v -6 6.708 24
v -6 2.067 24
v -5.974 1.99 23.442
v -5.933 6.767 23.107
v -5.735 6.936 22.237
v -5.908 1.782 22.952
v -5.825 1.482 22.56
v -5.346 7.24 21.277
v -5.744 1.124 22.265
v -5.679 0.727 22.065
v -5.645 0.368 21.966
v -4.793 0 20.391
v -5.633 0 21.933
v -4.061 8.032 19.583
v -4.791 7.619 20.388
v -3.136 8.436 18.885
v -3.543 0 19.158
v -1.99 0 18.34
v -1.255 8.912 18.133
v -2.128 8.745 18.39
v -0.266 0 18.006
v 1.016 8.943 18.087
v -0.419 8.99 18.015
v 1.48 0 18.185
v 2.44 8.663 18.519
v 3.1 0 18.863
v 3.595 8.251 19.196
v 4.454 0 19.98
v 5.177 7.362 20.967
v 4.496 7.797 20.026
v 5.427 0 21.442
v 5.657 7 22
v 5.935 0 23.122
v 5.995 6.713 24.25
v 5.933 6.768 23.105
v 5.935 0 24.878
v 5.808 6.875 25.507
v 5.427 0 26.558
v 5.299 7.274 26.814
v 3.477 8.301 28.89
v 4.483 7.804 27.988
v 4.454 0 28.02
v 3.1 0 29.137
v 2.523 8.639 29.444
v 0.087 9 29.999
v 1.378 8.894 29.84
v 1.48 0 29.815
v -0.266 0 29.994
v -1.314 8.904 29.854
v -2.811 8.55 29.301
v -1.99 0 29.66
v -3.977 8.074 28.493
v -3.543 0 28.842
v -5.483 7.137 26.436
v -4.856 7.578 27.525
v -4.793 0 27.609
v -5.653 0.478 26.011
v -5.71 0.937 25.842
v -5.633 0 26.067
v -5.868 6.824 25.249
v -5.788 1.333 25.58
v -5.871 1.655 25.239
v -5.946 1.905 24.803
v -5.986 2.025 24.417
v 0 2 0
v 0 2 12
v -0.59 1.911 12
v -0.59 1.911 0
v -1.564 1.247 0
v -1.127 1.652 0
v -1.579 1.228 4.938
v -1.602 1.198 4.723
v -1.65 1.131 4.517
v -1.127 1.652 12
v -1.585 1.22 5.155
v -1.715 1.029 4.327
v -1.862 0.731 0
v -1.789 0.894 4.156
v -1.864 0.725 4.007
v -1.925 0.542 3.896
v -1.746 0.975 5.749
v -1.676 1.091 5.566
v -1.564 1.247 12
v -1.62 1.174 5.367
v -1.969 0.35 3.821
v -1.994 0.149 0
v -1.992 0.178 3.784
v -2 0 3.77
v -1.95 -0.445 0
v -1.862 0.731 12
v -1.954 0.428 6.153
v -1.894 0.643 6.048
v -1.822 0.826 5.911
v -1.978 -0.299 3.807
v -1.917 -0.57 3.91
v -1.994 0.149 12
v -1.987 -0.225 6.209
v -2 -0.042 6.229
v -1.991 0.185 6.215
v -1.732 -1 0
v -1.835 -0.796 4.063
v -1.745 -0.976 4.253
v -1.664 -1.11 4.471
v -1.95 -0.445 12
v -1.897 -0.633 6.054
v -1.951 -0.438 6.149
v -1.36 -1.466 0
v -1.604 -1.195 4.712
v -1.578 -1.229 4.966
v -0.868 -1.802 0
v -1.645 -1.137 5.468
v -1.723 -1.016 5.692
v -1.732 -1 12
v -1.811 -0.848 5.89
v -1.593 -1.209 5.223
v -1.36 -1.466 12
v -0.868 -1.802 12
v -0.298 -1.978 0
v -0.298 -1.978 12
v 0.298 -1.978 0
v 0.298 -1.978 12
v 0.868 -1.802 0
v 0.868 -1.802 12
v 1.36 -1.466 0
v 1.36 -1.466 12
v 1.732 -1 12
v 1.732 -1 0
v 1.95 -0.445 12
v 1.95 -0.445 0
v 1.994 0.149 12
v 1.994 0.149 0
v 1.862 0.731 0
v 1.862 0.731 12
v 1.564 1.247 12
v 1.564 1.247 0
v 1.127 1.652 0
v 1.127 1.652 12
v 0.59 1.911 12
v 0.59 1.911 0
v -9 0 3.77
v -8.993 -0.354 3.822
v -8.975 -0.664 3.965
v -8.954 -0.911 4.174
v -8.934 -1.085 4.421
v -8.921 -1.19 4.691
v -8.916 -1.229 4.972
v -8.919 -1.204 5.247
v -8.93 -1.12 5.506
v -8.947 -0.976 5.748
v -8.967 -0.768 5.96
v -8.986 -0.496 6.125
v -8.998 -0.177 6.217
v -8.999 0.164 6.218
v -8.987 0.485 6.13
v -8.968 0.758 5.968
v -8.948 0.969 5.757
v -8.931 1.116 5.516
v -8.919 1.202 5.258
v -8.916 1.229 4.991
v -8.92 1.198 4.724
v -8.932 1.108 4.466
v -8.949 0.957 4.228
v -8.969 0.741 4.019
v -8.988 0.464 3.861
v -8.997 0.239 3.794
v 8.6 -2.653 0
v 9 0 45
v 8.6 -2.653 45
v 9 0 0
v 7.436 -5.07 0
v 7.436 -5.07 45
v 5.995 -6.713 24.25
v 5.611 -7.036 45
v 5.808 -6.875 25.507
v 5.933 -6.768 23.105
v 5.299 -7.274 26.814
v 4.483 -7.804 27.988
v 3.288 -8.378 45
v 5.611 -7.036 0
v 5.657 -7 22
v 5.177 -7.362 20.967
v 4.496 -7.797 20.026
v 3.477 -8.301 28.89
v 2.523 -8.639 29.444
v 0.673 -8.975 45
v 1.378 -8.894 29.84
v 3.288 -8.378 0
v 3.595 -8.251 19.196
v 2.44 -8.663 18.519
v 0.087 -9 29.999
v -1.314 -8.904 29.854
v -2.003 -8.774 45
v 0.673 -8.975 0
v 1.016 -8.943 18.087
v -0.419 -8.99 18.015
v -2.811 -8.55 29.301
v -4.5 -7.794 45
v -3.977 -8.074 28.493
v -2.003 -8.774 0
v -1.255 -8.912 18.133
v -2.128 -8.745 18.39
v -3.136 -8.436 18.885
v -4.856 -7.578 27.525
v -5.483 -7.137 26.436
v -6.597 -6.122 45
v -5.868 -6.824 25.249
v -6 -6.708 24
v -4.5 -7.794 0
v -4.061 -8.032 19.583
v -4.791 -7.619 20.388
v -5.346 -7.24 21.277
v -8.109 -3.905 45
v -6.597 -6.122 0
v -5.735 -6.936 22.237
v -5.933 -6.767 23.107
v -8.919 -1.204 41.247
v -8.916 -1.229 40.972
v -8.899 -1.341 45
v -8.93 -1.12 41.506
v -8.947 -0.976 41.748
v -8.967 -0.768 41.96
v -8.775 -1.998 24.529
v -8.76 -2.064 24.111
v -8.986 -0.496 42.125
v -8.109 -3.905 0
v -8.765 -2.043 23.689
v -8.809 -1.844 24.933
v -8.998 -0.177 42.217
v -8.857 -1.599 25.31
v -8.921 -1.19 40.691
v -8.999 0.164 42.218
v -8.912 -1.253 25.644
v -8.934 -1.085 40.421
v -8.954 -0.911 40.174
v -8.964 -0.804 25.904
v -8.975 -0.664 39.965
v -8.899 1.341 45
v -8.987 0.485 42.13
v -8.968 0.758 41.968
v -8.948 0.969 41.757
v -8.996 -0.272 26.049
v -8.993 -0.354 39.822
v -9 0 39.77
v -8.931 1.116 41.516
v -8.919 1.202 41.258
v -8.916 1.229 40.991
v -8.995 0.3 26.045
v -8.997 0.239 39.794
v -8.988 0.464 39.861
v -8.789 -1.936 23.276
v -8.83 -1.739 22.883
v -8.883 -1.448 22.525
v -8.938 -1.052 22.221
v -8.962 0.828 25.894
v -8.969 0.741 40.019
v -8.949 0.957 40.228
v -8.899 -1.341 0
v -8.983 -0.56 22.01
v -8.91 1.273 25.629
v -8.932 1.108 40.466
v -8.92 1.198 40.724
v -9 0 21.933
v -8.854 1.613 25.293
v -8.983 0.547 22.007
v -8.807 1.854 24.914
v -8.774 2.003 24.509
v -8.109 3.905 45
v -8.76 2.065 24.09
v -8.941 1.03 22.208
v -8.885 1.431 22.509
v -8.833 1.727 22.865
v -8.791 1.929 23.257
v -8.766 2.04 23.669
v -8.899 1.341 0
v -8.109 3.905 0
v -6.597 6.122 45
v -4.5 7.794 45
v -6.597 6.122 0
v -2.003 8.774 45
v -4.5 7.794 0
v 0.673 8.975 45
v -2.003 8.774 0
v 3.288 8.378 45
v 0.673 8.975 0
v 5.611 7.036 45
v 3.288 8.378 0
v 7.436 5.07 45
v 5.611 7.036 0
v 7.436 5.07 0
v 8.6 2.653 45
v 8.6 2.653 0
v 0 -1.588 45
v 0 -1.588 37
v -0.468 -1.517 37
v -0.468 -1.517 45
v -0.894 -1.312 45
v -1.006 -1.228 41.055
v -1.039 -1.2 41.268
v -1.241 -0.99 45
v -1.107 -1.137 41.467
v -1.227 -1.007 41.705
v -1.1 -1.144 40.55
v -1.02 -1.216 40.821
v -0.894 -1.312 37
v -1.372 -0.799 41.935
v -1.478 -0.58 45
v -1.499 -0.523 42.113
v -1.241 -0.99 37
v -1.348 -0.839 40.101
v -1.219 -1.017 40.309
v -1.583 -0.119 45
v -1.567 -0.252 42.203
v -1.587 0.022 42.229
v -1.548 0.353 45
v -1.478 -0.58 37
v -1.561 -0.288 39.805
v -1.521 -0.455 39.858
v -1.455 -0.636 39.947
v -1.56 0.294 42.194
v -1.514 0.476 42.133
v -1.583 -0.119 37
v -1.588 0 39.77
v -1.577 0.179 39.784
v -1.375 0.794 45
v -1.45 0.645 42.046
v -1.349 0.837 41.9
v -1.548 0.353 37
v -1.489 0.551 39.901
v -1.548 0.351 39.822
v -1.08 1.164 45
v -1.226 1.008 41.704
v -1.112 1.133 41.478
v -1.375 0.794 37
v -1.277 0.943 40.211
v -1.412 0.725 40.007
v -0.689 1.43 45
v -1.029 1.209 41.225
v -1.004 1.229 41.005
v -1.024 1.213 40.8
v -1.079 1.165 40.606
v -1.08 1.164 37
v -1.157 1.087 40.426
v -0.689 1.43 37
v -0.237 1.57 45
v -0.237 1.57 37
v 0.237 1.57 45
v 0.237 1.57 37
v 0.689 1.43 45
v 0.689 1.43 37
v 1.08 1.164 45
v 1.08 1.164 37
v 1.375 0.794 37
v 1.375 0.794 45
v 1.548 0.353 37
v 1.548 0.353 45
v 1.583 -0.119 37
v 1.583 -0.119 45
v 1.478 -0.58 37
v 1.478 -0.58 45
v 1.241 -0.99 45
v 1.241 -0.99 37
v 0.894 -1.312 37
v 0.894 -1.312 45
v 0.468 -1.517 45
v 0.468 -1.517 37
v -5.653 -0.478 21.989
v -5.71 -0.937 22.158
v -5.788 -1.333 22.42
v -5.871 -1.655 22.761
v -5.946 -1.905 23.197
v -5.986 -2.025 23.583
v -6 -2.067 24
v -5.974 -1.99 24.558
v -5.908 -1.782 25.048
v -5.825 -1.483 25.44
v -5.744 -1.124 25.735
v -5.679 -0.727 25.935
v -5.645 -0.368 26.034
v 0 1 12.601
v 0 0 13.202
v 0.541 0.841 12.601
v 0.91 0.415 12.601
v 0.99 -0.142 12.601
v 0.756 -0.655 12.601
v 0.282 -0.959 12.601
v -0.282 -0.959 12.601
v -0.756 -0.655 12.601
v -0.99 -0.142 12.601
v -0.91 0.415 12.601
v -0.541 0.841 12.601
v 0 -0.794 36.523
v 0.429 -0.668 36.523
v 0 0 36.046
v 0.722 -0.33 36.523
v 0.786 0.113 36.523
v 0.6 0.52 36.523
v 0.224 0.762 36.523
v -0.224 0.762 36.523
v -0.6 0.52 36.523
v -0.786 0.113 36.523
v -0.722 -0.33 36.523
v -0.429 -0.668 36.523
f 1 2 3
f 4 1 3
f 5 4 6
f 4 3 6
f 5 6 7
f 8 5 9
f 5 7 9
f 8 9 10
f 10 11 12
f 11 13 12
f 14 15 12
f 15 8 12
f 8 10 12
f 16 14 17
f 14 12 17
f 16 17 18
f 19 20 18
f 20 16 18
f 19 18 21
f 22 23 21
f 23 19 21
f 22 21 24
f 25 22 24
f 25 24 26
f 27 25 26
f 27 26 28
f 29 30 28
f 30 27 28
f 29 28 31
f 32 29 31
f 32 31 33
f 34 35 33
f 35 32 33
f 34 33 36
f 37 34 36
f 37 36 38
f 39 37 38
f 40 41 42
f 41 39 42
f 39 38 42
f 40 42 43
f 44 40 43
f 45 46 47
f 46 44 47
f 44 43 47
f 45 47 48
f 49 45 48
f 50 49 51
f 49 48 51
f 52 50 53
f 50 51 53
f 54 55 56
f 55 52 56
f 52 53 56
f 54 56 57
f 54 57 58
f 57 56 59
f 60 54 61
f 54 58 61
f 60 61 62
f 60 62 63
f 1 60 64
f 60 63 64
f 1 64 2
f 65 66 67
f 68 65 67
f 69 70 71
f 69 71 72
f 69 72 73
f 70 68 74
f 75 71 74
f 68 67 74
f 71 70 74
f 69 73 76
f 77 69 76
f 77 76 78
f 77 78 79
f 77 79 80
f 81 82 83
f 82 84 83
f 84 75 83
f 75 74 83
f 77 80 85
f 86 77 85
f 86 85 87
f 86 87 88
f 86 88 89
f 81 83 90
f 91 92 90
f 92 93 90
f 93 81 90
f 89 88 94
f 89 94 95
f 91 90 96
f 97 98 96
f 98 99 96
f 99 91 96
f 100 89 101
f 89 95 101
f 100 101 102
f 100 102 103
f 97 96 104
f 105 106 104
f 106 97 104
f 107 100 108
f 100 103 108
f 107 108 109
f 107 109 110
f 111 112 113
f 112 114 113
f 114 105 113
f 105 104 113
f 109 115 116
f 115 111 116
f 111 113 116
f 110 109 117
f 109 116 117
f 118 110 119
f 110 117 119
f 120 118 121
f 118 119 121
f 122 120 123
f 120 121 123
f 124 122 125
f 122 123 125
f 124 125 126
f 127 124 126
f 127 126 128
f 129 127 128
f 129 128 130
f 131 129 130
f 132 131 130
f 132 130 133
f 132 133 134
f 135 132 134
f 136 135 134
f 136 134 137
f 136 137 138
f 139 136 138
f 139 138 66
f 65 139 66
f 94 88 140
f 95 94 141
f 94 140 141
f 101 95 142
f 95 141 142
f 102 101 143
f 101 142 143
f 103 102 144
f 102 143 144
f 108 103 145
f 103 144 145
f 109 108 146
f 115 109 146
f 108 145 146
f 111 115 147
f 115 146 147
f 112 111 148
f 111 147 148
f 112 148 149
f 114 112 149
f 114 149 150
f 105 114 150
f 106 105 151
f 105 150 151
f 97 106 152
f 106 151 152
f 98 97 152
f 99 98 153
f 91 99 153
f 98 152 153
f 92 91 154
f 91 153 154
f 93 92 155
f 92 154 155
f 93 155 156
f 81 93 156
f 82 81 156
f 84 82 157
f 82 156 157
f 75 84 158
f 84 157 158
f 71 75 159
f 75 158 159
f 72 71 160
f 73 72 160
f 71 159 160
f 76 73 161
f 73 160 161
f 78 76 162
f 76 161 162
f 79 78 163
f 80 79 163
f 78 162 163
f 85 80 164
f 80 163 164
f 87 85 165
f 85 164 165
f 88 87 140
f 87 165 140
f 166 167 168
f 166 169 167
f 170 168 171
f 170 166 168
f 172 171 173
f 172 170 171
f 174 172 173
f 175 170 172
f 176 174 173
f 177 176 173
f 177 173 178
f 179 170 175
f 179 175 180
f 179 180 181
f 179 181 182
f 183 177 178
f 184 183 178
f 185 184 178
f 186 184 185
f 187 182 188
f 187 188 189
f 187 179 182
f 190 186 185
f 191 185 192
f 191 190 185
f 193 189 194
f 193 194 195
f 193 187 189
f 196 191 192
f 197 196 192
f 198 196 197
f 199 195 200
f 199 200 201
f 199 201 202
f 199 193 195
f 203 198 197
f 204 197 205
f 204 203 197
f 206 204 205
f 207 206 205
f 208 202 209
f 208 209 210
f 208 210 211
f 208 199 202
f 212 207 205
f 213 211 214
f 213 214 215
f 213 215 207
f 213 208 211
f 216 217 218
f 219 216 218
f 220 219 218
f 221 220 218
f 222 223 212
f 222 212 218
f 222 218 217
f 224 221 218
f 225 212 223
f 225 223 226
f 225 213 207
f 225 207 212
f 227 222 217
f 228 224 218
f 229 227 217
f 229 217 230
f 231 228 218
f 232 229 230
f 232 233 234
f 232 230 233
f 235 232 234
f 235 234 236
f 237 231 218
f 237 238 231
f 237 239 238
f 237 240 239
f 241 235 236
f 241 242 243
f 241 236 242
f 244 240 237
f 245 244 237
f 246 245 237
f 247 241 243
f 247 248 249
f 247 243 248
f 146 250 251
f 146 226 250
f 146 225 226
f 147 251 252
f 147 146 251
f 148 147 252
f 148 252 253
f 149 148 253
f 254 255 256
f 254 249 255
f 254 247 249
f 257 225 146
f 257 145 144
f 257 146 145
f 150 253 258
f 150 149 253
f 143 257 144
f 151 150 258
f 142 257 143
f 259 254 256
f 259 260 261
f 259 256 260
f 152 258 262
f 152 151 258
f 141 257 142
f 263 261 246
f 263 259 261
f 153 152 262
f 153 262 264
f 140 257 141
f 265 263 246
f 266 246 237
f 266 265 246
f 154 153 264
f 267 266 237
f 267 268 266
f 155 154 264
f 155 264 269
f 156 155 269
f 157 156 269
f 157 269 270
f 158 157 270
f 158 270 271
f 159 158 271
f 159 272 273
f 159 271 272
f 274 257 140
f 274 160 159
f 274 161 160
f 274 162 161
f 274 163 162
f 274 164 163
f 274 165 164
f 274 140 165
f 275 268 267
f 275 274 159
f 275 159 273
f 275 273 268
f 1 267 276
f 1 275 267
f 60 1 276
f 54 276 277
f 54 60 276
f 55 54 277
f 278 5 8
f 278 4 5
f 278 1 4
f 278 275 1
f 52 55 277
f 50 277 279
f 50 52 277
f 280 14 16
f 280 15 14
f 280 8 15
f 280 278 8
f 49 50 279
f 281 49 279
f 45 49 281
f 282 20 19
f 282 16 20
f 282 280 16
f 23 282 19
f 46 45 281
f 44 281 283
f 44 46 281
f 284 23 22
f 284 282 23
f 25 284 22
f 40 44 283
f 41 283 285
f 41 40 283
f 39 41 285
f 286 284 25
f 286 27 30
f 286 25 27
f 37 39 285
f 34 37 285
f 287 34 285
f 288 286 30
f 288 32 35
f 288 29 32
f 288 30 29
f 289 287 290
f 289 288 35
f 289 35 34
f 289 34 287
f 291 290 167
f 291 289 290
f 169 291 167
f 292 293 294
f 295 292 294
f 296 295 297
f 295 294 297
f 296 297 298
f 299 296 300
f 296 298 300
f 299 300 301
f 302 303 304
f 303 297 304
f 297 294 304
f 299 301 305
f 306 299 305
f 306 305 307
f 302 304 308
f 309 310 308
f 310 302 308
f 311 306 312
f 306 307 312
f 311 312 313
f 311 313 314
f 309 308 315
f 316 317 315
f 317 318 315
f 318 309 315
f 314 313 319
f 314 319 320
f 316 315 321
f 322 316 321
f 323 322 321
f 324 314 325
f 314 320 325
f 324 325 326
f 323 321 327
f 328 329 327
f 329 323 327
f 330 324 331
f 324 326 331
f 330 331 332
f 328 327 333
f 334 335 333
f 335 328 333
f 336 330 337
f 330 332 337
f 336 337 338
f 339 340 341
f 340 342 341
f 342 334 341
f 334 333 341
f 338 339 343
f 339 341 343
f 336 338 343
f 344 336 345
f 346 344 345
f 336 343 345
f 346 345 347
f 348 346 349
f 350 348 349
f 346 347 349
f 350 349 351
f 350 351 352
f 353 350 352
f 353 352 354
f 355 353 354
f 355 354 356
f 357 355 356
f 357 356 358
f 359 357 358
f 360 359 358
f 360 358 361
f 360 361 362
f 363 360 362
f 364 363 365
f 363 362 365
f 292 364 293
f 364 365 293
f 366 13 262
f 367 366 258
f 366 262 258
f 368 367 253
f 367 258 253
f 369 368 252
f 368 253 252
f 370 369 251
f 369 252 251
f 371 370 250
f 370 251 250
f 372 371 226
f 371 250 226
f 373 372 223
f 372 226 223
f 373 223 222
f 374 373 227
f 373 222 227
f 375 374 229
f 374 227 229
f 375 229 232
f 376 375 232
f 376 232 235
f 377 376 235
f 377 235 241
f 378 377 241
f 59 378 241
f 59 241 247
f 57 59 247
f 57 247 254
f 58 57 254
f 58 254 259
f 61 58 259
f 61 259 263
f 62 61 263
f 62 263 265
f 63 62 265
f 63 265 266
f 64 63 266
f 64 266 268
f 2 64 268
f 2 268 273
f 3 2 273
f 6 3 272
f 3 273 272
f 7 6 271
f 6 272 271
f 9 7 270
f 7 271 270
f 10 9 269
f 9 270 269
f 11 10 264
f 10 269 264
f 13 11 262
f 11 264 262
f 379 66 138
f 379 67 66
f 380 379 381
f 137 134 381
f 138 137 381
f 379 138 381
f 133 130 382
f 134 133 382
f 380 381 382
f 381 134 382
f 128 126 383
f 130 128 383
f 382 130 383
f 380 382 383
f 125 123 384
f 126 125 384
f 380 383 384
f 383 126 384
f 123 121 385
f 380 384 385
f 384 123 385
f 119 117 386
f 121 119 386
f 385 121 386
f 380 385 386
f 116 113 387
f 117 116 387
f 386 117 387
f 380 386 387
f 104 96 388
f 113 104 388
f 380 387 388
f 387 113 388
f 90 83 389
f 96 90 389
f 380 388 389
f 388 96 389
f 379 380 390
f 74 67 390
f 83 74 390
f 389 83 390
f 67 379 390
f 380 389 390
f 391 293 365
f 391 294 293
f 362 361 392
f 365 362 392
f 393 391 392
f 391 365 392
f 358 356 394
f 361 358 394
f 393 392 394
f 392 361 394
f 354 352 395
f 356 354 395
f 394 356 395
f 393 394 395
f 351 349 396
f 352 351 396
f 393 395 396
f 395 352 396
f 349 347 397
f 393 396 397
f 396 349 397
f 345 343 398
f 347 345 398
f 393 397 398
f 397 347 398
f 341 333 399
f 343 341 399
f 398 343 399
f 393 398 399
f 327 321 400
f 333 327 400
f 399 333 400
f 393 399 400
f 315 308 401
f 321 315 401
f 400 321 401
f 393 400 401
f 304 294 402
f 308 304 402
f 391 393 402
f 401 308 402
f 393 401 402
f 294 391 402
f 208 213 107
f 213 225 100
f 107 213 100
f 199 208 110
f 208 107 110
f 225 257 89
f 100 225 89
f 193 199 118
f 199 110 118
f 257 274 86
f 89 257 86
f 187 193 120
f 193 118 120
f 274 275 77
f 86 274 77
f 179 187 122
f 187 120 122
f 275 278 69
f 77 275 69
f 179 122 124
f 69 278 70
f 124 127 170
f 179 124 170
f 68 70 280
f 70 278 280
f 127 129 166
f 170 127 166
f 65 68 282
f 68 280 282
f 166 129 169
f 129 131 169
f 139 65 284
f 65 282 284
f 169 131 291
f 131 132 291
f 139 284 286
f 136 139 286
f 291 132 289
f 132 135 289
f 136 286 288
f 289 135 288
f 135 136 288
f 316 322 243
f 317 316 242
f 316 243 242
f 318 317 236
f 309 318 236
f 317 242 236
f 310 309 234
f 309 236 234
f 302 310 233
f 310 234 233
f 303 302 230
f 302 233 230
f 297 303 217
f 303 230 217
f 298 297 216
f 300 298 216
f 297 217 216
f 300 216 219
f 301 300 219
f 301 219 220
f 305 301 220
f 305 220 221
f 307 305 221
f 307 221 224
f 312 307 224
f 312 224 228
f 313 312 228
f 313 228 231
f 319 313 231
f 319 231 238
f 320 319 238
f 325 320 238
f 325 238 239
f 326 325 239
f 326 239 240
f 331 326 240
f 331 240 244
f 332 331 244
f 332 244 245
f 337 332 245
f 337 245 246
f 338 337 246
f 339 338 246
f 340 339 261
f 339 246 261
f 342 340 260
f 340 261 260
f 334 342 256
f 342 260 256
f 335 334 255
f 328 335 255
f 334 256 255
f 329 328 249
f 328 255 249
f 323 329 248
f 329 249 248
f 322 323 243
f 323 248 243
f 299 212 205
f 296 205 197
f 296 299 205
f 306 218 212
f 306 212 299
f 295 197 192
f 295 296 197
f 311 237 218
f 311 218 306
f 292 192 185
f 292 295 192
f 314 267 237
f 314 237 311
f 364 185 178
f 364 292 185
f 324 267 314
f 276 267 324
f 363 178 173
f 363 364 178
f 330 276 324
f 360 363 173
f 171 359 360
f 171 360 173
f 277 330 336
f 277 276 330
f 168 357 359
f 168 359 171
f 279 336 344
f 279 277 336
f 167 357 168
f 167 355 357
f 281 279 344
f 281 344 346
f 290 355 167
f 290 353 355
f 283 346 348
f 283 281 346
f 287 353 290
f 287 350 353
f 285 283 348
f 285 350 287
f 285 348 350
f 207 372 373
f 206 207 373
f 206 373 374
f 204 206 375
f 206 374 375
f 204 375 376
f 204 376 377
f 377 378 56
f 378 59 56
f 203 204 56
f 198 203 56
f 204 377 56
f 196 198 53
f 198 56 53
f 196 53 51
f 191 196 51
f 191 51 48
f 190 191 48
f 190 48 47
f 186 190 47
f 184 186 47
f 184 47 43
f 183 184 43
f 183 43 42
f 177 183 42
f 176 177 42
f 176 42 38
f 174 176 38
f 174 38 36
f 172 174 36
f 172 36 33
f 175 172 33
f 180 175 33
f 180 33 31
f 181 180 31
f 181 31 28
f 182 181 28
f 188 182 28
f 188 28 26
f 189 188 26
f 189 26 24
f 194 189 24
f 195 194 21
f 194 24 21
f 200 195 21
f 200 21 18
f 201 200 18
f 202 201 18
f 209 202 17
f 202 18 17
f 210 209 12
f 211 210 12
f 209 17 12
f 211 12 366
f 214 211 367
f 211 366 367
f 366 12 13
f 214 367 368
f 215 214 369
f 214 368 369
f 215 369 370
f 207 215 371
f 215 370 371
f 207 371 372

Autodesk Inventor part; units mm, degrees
ref_plane "YZ Plane" through (0, 0, 0) normal (1, 0, 0) x (0, 1, 0)
ref_plane "XZ Plane" through (0, 0, 0) normal (0, 1, 0) x (-1, 0, 0)
ref_plane "XY Plane" through (0, 0, 0) normal (0, 0, 1) x (1, 0, 0)
sketch "Sketch1" plane through (0, 0, 0) normal (0, 0, 1) x (1, 0, 0)
  circle A0 centre (0, 0) radius 9
  dimension "d0" = 18
extrude "Extrusion1" add sketch "Sketch1" along normal blind 45
sketch "Sketch2" plane through (0, 0, 45) normal (0, 0, 1) x (1, 0, 0)
  point P0 (0, 0)
  point P1 (0, 0)
hole "Hole1" at (0, 0, 45) direction (0, 0, -1) diameter 3.175 depth 8 tip angle 118
sketch "Sketch3" plane through (0, 0, 0) normal (0, 0, -1) x (-1, 0, 0)
  point P0 (0, 0)
  point P1 (0, 0)
hole "Hole2" at (0, 0, 0) direction (0, 0, 1) diameter 4 depth 12 tip angle 118
sketch "Sketch4" plane through (0, 0, 0) normal (0, 1, 0) x (-1, 0, 0)
  circle A0 centre (0, 24) radius 6
  line L0 (9, 45) -> (-9, 45) projected
  point P0 (0, 0)
  dimension "d17" = 21
  dimension "d18" = 12
extrude "Extrusion2" cut sketch "Sketch4" along normal through all both and the other way through all
sketch "Sketch5" plane through (0, 0, 0) normal (1, 0, 0) x (0, 1, 0)
  line L0 (9, 45) -> (-9, 45) projected
  line L1 (-9, 0) -> (9, 0) projected
  point P0 (0, 0)
  point P1 (0, 41)
  point P2 (0, 5)
  dimension "d21" = 4
  dimension "d22" = 5
hole "Hole3" at (0, 0, 41) at (0, 0, 5) direction (-1, 0, 0) diameter 2.459 end through all thread size "M3x0.5" class "6H" standard "ANSI Metric M Profile"
sketch "Sketch6" plane through (0, 0, 0) normal (1, 0, 0) x (0, 1, 0)
  line L0 (-9, 0) -> (9, 0) projected
  point P0 (0, 0)
  point P1 (0, 24)
  dimension "d30" = 24
hole "Hole4" at (0, 0, 24) direction (-1, 0, 0) diameter 4.134 end through all thread size "M5x0.8" class "6H" standard "ANSI Metric M Profile"
properties part number "MotorPotCouple"
